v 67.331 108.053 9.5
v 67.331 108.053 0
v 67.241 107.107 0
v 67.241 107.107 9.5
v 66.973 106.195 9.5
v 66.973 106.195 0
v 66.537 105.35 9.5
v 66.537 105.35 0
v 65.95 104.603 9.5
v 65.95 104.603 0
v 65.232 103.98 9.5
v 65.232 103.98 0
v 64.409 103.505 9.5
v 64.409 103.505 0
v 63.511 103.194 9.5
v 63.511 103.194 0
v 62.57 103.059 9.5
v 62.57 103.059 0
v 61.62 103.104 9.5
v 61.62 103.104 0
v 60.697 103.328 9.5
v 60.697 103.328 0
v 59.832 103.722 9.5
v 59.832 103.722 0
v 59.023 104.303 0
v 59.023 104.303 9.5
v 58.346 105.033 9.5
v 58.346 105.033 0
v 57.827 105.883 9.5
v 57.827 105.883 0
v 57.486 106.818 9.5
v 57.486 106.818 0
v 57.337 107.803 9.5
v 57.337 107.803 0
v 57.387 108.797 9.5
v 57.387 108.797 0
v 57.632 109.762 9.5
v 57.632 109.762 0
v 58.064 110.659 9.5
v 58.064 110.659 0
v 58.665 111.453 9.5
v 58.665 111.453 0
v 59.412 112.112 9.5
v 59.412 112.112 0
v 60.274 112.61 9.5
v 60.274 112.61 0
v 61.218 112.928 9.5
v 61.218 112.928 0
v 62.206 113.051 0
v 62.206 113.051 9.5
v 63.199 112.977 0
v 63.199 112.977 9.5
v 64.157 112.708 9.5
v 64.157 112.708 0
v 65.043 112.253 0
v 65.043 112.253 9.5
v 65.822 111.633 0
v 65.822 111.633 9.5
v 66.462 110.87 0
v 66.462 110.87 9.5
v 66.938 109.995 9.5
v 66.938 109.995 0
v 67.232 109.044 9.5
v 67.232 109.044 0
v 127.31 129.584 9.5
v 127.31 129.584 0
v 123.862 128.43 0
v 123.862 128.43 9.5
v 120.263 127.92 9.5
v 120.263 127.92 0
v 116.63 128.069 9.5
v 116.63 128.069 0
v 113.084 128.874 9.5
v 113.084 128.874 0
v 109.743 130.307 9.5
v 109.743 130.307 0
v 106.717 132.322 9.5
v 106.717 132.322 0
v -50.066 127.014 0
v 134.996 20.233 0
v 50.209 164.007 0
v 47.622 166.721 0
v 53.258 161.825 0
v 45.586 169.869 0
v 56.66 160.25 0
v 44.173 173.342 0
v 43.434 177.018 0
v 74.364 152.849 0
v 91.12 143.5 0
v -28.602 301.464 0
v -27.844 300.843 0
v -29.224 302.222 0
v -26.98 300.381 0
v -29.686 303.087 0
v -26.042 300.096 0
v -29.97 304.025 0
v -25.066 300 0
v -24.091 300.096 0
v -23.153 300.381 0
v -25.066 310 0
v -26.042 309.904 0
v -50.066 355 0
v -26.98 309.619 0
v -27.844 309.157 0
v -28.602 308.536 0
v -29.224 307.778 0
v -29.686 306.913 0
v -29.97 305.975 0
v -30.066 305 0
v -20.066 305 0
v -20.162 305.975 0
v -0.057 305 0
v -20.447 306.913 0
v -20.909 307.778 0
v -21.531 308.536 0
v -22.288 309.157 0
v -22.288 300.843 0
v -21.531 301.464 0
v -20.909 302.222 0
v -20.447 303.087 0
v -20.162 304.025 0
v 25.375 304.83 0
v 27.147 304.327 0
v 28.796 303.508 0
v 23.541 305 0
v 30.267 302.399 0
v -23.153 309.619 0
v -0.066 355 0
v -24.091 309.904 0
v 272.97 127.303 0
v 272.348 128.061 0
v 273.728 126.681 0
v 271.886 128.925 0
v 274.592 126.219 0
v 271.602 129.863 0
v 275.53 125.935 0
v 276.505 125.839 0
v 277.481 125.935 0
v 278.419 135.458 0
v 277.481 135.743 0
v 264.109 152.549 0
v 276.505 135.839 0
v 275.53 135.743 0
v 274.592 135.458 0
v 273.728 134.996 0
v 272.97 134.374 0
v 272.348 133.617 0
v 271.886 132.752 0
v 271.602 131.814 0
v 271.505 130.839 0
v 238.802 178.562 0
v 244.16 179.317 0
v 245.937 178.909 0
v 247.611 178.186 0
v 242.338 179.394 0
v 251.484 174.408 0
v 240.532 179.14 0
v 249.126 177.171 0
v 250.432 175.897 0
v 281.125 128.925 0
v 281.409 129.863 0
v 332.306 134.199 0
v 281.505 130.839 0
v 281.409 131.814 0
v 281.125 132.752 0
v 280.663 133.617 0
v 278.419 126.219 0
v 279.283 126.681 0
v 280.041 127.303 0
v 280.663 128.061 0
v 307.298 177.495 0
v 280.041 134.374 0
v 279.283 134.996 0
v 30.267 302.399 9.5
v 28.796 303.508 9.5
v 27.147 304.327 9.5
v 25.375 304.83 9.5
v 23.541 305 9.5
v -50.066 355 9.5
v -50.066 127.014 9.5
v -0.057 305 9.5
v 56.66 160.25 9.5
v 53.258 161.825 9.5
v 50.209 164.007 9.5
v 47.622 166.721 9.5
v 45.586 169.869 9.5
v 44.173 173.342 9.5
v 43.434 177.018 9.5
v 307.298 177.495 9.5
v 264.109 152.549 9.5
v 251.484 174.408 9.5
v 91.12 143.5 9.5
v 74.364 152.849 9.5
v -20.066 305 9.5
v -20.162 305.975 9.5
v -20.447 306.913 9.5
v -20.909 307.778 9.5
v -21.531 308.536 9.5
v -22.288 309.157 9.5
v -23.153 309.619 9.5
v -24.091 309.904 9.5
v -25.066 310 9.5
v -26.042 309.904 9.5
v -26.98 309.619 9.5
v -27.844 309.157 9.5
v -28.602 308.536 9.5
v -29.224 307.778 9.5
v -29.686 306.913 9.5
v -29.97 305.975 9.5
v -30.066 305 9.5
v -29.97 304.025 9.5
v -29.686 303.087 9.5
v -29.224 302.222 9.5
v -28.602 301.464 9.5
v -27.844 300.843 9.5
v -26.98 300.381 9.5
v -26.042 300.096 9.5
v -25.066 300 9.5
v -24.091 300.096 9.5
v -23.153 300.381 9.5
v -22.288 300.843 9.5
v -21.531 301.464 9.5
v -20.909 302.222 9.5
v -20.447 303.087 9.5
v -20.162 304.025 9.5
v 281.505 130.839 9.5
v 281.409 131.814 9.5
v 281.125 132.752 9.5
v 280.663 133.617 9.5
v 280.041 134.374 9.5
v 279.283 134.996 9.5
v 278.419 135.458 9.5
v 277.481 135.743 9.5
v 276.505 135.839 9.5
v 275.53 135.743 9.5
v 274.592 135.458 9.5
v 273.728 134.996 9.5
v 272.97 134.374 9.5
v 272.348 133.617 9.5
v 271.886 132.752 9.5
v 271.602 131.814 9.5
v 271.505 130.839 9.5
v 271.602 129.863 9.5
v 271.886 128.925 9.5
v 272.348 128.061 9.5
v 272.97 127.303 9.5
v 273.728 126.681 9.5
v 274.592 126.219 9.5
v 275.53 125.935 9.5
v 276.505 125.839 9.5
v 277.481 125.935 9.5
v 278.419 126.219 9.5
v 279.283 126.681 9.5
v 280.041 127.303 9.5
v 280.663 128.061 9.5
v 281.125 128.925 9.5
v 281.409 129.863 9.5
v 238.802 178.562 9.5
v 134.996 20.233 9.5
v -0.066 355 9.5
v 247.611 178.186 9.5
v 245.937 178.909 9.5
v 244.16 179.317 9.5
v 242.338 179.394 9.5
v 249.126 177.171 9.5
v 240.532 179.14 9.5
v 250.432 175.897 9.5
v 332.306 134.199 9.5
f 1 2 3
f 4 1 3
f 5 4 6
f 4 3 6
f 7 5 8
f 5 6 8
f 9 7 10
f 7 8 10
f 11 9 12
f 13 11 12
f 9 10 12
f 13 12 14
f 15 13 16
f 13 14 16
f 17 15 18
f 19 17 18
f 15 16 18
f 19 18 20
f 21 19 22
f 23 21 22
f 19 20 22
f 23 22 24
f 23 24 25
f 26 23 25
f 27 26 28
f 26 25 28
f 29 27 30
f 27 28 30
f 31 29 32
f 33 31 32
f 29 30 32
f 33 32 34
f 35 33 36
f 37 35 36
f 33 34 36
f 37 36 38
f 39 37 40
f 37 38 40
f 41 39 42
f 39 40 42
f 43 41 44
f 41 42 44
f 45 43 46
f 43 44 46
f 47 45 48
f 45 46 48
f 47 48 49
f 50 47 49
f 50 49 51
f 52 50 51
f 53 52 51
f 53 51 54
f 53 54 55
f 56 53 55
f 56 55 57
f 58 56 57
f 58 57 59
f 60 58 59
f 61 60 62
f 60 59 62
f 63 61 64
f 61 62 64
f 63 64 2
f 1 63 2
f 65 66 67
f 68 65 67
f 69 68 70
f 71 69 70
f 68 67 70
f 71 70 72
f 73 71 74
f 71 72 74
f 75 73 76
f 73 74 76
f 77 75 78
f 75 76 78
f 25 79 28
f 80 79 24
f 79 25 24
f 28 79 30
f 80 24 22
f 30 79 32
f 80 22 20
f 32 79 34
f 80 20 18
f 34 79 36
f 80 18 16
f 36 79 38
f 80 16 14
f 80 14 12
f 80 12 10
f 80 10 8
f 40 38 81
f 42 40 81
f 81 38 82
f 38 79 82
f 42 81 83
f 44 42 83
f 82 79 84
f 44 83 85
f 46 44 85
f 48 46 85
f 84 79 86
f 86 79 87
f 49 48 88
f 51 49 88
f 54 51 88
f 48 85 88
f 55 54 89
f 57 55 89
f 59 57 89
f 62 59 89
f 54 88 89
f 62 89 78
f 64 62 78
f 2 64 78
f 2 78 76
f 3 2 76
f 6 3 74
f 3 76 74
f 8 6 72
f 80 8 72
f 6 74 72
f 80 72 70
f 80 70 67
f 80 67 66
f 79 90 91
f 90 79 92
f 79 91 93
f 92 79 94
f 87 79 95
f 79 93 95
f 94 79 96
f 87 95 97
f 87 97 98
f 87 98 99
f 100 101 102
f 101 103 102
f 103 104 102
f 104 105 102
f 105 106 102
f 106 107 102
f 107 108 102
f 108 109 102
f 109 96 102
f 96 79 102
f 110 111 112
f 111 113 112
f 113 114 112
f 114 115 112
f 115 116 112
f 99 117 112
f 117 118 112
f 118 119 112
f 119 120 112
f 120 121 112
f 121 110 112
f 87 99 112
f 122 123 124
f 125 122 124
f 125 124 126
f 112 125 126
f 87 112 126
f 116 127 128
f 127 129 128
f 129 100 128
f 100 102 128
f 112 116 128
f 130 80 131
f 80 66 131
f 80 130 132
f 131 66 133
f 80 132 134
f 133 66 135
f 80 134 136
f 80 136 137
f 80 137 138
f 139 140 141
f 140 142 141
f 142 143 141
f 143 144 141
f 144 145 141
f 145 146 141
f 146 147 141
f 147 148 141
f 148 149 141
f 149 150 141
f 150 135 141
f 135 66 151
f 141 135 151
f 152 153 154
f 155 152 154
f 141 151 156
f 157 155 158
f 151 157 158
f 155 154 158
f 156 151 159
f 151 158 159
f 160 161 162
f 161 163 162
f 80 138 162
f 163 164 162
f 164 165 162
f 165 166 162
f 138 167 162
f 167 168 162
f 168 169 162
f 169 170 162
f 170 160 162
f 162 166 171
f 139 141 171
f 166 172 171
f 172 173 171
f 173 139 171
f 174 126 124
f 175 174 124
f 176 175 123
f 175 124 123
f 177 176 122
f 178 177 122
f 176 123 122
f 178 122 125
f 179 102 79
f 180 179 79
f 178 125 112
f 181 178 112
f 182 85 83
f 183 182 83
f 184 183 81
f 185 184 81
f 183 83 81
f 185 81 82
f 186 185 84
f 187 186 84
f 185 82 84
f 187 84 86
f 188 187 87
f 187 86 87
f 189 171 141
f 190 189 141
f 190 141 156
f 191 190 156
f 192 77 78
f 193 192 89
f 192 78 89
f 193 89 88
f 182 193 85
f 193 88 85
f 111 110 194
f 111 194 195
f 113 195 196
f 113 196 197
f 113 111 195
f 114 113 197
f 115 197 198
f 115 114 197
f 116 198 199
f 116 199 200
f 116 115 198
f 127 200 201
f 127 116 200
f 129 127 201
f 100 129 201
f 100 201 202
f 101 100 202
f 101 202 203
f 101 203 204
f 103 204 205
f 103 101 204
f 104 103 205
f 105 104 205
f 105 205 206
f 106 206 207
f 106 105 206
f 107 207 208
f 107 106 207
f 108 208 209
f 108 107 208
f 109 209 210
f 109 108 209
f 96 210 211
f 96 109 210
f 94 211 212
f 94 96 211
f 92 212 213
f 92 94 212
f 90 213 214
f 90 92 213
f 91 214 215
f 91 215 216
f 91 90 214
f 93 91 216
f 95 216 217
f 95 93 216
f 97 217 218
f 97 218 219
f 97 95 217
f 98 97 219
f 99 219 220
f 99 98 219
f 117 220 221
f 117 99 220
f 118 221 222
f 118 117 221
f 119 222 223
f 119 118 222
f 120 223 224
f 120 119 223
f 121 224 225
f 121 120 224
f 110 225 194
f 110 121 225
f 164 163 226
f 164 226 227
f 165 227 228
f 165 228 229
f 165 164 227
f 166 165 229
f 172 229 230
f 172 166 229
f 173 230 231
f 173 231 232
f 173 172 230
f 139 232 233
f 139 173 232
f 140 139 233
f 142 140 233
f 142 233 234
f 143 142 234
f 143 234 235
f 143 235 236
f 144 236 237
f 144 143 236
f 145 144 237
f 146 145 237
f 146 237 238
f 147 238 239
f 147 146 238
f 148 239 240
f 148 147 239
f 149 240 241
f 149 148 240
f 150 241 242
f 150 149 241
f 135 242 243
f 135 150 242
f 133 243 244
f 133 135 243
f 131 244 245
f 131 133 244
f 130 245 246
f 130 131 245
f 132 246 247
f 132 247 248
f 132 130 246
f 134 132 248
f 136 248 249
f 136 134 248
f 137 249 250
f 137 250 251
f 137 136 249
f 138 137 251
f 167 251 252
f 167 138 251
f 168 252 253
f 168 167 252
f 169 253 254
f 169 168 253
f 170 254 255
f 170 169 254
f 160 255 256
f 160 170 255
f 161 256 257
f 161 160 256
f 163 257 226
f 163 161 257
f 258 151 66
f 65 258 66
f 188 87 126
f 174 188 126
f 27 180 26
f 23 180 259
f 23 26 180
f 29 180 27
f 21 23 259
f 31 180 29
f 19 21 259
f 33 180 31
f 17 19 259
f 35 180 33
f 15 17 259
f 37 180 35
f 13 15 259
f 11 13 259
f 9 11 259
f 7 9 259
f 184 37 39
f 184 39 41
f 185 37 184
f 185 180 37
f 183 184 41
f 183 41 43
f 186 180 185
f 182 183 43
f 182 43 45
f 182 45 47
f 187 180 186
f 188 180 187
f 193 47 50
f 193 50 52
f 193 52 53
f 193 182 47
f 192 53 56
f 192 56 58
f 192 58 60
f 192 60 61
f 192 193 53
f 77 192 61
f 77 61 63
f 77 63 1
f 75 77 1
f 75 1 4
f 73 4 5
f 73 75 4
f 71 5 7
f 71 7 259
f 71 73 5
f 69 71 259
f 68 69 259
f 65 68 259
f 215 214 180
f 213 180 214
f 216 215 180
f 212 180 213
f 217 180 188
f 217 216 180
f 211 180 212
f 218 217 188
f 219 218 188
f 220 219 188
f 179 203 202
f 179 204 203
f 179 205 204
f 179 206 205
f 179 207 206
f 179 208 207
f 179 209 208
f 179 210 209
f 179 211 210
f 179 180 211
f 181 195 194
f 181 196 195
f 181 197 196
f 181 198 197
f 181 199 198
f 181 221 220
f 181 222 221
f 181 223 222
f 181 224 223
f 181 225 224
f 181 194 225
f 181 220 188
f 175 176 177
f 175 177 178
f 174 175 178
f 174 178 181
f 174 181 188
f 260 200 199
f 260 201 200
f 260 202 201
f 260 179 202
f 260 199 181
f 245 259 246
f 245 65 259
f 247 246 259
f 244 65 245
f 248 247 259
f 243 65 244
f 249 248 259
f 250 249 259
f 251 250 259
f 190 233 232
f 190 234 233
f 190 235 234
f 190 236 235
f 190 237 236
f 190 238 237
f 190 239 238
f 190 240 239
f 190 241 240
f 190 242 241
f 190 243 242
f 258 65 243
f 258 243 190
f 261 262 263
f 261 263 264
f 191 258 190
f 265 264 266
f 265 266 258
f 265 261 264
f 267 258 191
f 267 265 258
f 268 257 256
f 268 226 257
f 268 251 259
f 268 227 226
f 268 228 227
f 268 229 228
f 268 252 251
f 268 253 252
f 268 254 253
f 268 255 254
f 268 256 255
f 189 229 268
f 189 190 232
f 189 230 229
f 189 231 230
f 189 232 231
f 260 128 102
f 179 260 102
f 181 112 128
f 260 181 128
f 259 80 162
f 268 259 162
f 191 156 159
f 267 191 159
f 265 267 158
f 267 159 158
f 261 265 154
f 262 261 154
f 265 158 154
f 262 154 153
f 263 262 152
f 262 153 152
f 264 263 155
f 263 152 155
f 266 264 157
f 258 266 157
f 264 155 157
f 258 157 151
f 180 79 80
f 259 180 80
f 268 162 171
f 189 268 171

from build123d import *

# Parameters (mm, degrees)
F0_R     = 5
F1_DEPTH = 9.5


with BuildPart() as f1:
    # F0 (on Top) → F1 (new body)
    with BuildSketch(Plane.XY):
        with BuildLine():
            ThreePointArc((251.4837984218, 174.4078397694), (245.9373500957, 178.9093807212), (238.8024981834, 178.5617484971))
            Line((238.8024981834, 178.5617484971), (139.4635551595, 134.9226100063))
            Line((139.4635551595, 134.9226100063), (127.3100964327, 129.5836517652))
            ThreePointArc((127.3100964327, 129.5836517652), (116.6299314638, 128.0692059728), (106.7166346632, 132.3219717036))
            ThreePointArc((106.7166346632, 132.3219717036), (82.8740793121, 148.410763694), (56.6604115001, 160.2496949469))
            ThreePointArc((56.6604115001, 160.2496949469), (47.6215255634, 166.7206128225), (43.4338375319, 177.0180642585))
            Line((43.4338375319, 177.0180642585), (30.2674388345, 302.399259814))
            ThreePointArc((30.2674388345, 302.399259814), (27.1466203514, 304.3271806603), (23.5405558858, 305))
            Line((23.5405558858, 305), (-0.0569906184, 305))
            Line((-0.0569906184, 305), (-0.0663333427, 305))
            Line((-0.0663333427, 305), (-0.0663333427, 355))
            Line((-0.0663333427, 355), (-50.0663333427, 355))
            Line((-50.0663333427, 355), (-50.0663333427, 127.0140681159))
            Line((-50.0663333427, 127.0140681159), (134.9963067562, 20.2325334796))
            Line((134.9963067562, 20.2325334796), (332.3060807422, 134.1985475298))
            Line((332.3060807422, 134.1985475298), (307.2979901421, 177.495145601))
            Line((307.2979901421, 177.495145601), (264.1092482344, 152.5493526602))
            Line((264.1092482344, 152.5493526602), (251.4837984218, 174.4078397694))
        make_face()
        with BuildLine():
            ThreePointArc((59.8321268024, 103.7222201288), (59.8304304841, 112.3828004264), (67.3309958809, 108.0529998887))
            ThreePointArc((67.3309958809, 108.0529998887), (64.8315612777, 103.723199351), (59.8321268024, 103.7222201288))
        make_face(mode=Mode.SUBTRACT)
        with Locations((276.5054373709, 130.8387559654)):
            Circle(F0_R, mode=Mode.SUBTRACT)
        with Locations((-25.0663333427, 305)):
            Circle(F0_R, mode=Mode.SUBTRACT)
        Polygon((-0.0663333427, 305), (-0.0569906184, 305), (-0.0663333427, 355), align=None)
    extrude(amount=F1_DEPTH)


solid = f1.part
